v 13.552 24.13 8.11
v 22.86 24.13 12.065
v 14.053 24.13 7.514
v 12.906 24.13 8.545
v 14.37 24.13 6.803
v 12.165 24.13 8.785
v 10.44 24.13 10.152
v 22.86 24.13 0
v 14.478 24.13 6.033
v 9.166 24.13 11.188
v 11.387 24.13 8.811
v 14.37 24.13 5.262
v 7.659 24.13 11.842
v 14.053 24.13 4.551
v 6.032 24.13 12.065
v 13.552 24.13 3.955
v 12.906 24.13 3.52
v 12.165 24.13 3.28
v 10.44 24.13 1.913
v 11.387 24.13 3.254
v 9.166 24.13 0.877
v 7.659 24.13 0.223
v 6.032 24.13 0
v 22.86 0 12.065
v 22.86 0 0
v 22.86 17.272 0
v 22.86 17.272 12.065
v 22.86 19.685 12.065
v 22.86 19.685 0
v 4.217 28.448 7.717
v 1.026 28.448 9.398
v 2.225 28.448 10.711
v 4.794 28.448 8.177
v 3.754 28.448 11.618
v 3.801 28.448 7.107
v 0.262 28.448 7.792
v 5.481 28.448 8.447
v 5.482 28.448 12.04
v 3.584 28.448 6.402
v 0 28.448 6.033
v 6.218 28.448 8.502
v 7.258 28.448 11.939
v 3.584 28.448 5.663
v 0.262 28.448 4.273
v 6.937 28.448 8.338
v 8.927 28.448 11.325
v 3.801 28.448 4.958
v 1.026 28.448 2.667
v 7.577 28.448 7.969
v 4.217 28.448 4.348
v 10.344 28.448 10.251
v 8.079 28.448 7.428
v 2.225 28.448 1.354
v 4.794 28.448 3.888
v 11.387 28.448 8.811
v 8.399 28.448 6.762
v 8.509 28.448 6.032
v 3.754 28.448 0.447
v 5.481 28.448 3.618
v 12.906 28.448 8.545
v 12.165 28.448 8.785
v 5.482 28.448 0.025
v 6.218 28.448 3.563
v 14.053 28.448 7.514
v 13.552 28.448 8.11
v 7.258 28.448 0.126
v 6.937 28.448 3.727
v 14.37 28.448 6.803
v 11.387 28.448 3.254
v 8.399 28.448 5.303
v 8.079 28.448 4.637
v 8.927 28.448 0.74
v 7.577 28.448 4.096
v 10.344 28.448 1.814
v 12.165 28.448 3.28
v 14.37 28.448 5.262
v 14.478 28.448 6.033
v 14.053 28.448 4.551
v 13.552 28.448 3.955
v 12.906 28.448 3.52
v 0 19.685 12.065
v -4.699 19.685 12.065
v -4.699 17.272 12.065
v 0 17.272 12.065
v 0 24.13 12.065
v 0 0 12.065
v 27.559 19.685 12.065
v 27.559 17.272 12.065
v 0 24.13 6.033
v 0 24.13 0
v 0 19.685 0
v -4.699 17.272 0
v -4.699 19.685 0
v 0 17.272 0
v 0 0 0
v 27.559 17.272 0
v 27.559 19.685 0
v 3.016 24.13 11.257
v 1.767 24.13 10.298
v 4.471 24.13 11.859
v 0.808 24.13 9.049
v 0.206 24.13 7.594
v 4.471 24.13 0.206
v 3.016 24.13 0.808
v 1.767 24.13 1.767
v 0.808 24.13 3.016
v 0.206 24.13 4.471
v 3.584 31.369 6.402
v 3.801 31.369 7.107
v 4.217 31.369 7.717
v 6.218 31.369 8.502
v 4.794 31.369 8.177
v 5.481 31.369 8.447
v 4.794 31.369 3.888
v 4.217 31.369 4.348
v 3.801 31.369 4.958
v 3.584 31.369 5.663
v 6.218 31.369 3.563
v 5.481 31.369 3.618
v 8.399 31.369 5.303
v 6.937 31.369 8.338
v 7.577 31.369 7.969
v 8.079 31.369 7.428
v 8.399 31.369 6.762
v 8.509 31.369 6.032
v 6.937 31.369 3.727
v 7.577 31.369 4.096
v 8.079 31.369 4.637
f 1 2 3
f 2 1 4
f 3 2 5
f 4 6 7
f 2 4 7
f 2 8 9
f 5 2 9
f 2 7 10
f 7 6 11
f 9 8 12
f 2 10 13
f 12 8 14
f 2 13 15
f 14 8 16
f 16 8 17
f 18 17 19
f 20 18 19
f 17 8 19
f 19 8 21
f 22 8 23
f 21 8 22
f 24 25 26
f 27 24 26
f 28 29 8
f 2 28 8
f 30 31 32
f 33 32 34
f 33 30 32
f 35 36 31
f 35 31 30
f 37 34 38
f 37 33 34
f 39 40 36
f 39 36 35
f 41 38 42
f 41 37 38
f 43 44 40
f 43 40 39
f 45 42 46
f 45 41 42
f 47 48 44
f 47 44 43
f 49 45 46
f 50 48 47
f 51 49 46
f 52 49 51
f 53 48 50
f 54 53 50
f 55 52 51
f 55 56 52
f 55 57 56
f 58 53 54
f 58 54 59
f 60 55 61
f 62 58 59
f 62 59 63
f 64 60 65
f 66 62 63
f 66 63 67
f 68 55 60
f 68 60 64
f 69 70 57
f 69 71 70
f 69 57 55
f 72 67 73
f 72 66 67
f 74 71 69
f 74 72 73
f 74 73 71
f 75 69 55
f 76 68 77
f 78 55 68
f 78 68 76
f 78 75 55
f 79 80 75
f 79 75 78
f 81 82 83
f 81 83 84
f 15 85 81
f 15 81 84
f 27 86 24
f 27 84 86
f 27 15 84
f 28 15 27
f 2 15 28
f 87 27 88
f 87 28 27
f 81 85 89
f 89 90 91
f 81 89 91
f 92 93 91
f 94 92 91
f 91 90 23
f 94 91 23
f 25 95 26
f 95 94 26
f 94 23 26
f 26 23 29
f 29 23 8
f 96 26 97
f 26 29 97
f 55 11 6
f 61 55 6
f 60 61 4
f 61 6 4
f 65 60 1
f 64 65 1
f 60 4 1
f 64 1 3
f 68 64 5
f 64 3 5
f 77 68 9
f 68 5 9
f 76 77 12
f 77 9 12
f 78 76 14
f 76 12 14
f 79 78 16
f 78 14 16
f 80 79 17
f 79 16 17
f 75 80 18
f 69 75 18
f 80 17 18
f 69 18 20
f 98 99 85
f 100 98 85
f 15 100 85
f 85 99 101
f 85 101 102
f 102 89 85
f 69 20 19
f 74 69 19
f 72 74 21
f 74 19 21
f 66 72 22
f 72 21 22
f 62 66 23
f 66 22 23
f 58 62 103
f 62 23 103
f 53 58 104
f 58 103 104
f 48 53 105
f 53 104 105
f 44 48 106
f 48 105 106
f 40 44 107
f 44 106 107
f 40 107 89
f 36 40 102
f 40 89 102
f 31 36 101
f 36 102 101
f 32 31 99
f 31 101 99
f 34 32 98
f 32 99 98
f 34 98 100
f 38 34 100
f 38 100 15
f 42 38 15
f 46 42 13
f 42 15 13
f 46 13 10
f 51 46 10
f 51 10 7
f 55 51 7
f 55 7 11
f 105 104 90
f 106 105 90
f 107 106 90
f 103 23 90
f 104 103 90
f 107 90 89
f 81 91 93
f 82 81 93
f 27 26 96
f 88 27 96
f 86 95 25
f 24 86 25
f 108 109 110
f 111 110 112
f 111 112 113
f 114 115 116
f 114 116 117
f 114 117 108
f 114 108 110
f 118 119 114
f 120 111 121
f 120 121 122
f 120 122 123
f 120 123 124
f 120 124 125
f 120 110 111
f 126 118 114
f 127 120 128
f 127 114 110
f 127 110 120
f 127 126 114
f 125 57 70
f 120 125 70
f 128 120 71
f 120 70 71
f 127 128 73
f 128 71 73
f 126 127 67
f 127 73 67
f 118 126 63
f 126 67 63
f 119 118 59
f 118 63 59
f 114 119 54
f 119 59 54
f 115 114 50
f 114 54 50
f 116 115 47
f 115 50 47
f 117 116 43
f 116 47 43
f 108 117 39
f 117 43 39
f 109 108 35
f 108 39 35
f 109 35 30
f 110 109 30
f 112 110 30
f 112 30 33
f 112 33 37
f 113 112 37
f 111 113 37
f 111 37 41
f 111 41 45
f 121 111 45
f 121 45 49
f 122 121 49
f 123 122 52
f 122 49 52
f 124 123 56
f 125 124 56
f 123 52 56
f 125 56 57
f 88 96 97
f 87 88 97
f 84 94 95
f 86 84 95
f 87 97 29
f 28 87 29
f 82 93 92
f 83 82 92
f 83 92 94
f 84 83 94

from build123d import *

# Parameters (mm, degrees)
BOSS_EXTRUDE1_DEPTH = 12.065
BOSS_EXTRUDE2_DEPTH = 4.318
SKETCH3_R           = 2.4765
BOSS_EXTRUDE3_DEPTH = 2.921


with BuildPart() as part:
    # Sketch1 → Boss-Extrude1 (new body)
    with BuildSketch(Plane.XY):
        Polygon((0, 0), (22.86, 0), (22.86, 17.272), (27.559, 17.272), (27.559, 19.685), (22.86, 19.685), (22.86, 24.13), (0, 24.13), (0, 19.685), (-4.699, 19.685), (-4.699, 17.272), (0, 17.272), align=None)
    extrude(amount=BOSS_EXTRUDE1_DEPTH)

    # Sketch2 → Boss-Extrude2 (add)
    with BuildSketch(Plane(origin=(0, 24.13, 0), x_dir=(1, 0, 0), z_dir=(0, 1, 0))):
        with BuildLine():
            ThreePointArc((11.387191011, -8.810690135), (14.478, -6.0325), (11.387191011, -3.254309865))
            ThreePointArc((11.387191011, -3.254309865), (0, -6.0325), (11.387191011, -8.810690135))
        make_face()
    extrude(amount=BOSS_EXTRUDE2_DEPTH)

    # Sketch3 → Boss-Extrude3 (add)
    with BuildSketch(Plane(origin=(0, 28.448, 0), x_dir=(1, 0, 0), z_dir=(0, 1, 0))):
        with Locations((6.0325, -6.0325)):
            Circle(SKETCH3_R)
    extrude(amount=BOSS_EXTRUDE3_DEPTH)


solid = part.part
